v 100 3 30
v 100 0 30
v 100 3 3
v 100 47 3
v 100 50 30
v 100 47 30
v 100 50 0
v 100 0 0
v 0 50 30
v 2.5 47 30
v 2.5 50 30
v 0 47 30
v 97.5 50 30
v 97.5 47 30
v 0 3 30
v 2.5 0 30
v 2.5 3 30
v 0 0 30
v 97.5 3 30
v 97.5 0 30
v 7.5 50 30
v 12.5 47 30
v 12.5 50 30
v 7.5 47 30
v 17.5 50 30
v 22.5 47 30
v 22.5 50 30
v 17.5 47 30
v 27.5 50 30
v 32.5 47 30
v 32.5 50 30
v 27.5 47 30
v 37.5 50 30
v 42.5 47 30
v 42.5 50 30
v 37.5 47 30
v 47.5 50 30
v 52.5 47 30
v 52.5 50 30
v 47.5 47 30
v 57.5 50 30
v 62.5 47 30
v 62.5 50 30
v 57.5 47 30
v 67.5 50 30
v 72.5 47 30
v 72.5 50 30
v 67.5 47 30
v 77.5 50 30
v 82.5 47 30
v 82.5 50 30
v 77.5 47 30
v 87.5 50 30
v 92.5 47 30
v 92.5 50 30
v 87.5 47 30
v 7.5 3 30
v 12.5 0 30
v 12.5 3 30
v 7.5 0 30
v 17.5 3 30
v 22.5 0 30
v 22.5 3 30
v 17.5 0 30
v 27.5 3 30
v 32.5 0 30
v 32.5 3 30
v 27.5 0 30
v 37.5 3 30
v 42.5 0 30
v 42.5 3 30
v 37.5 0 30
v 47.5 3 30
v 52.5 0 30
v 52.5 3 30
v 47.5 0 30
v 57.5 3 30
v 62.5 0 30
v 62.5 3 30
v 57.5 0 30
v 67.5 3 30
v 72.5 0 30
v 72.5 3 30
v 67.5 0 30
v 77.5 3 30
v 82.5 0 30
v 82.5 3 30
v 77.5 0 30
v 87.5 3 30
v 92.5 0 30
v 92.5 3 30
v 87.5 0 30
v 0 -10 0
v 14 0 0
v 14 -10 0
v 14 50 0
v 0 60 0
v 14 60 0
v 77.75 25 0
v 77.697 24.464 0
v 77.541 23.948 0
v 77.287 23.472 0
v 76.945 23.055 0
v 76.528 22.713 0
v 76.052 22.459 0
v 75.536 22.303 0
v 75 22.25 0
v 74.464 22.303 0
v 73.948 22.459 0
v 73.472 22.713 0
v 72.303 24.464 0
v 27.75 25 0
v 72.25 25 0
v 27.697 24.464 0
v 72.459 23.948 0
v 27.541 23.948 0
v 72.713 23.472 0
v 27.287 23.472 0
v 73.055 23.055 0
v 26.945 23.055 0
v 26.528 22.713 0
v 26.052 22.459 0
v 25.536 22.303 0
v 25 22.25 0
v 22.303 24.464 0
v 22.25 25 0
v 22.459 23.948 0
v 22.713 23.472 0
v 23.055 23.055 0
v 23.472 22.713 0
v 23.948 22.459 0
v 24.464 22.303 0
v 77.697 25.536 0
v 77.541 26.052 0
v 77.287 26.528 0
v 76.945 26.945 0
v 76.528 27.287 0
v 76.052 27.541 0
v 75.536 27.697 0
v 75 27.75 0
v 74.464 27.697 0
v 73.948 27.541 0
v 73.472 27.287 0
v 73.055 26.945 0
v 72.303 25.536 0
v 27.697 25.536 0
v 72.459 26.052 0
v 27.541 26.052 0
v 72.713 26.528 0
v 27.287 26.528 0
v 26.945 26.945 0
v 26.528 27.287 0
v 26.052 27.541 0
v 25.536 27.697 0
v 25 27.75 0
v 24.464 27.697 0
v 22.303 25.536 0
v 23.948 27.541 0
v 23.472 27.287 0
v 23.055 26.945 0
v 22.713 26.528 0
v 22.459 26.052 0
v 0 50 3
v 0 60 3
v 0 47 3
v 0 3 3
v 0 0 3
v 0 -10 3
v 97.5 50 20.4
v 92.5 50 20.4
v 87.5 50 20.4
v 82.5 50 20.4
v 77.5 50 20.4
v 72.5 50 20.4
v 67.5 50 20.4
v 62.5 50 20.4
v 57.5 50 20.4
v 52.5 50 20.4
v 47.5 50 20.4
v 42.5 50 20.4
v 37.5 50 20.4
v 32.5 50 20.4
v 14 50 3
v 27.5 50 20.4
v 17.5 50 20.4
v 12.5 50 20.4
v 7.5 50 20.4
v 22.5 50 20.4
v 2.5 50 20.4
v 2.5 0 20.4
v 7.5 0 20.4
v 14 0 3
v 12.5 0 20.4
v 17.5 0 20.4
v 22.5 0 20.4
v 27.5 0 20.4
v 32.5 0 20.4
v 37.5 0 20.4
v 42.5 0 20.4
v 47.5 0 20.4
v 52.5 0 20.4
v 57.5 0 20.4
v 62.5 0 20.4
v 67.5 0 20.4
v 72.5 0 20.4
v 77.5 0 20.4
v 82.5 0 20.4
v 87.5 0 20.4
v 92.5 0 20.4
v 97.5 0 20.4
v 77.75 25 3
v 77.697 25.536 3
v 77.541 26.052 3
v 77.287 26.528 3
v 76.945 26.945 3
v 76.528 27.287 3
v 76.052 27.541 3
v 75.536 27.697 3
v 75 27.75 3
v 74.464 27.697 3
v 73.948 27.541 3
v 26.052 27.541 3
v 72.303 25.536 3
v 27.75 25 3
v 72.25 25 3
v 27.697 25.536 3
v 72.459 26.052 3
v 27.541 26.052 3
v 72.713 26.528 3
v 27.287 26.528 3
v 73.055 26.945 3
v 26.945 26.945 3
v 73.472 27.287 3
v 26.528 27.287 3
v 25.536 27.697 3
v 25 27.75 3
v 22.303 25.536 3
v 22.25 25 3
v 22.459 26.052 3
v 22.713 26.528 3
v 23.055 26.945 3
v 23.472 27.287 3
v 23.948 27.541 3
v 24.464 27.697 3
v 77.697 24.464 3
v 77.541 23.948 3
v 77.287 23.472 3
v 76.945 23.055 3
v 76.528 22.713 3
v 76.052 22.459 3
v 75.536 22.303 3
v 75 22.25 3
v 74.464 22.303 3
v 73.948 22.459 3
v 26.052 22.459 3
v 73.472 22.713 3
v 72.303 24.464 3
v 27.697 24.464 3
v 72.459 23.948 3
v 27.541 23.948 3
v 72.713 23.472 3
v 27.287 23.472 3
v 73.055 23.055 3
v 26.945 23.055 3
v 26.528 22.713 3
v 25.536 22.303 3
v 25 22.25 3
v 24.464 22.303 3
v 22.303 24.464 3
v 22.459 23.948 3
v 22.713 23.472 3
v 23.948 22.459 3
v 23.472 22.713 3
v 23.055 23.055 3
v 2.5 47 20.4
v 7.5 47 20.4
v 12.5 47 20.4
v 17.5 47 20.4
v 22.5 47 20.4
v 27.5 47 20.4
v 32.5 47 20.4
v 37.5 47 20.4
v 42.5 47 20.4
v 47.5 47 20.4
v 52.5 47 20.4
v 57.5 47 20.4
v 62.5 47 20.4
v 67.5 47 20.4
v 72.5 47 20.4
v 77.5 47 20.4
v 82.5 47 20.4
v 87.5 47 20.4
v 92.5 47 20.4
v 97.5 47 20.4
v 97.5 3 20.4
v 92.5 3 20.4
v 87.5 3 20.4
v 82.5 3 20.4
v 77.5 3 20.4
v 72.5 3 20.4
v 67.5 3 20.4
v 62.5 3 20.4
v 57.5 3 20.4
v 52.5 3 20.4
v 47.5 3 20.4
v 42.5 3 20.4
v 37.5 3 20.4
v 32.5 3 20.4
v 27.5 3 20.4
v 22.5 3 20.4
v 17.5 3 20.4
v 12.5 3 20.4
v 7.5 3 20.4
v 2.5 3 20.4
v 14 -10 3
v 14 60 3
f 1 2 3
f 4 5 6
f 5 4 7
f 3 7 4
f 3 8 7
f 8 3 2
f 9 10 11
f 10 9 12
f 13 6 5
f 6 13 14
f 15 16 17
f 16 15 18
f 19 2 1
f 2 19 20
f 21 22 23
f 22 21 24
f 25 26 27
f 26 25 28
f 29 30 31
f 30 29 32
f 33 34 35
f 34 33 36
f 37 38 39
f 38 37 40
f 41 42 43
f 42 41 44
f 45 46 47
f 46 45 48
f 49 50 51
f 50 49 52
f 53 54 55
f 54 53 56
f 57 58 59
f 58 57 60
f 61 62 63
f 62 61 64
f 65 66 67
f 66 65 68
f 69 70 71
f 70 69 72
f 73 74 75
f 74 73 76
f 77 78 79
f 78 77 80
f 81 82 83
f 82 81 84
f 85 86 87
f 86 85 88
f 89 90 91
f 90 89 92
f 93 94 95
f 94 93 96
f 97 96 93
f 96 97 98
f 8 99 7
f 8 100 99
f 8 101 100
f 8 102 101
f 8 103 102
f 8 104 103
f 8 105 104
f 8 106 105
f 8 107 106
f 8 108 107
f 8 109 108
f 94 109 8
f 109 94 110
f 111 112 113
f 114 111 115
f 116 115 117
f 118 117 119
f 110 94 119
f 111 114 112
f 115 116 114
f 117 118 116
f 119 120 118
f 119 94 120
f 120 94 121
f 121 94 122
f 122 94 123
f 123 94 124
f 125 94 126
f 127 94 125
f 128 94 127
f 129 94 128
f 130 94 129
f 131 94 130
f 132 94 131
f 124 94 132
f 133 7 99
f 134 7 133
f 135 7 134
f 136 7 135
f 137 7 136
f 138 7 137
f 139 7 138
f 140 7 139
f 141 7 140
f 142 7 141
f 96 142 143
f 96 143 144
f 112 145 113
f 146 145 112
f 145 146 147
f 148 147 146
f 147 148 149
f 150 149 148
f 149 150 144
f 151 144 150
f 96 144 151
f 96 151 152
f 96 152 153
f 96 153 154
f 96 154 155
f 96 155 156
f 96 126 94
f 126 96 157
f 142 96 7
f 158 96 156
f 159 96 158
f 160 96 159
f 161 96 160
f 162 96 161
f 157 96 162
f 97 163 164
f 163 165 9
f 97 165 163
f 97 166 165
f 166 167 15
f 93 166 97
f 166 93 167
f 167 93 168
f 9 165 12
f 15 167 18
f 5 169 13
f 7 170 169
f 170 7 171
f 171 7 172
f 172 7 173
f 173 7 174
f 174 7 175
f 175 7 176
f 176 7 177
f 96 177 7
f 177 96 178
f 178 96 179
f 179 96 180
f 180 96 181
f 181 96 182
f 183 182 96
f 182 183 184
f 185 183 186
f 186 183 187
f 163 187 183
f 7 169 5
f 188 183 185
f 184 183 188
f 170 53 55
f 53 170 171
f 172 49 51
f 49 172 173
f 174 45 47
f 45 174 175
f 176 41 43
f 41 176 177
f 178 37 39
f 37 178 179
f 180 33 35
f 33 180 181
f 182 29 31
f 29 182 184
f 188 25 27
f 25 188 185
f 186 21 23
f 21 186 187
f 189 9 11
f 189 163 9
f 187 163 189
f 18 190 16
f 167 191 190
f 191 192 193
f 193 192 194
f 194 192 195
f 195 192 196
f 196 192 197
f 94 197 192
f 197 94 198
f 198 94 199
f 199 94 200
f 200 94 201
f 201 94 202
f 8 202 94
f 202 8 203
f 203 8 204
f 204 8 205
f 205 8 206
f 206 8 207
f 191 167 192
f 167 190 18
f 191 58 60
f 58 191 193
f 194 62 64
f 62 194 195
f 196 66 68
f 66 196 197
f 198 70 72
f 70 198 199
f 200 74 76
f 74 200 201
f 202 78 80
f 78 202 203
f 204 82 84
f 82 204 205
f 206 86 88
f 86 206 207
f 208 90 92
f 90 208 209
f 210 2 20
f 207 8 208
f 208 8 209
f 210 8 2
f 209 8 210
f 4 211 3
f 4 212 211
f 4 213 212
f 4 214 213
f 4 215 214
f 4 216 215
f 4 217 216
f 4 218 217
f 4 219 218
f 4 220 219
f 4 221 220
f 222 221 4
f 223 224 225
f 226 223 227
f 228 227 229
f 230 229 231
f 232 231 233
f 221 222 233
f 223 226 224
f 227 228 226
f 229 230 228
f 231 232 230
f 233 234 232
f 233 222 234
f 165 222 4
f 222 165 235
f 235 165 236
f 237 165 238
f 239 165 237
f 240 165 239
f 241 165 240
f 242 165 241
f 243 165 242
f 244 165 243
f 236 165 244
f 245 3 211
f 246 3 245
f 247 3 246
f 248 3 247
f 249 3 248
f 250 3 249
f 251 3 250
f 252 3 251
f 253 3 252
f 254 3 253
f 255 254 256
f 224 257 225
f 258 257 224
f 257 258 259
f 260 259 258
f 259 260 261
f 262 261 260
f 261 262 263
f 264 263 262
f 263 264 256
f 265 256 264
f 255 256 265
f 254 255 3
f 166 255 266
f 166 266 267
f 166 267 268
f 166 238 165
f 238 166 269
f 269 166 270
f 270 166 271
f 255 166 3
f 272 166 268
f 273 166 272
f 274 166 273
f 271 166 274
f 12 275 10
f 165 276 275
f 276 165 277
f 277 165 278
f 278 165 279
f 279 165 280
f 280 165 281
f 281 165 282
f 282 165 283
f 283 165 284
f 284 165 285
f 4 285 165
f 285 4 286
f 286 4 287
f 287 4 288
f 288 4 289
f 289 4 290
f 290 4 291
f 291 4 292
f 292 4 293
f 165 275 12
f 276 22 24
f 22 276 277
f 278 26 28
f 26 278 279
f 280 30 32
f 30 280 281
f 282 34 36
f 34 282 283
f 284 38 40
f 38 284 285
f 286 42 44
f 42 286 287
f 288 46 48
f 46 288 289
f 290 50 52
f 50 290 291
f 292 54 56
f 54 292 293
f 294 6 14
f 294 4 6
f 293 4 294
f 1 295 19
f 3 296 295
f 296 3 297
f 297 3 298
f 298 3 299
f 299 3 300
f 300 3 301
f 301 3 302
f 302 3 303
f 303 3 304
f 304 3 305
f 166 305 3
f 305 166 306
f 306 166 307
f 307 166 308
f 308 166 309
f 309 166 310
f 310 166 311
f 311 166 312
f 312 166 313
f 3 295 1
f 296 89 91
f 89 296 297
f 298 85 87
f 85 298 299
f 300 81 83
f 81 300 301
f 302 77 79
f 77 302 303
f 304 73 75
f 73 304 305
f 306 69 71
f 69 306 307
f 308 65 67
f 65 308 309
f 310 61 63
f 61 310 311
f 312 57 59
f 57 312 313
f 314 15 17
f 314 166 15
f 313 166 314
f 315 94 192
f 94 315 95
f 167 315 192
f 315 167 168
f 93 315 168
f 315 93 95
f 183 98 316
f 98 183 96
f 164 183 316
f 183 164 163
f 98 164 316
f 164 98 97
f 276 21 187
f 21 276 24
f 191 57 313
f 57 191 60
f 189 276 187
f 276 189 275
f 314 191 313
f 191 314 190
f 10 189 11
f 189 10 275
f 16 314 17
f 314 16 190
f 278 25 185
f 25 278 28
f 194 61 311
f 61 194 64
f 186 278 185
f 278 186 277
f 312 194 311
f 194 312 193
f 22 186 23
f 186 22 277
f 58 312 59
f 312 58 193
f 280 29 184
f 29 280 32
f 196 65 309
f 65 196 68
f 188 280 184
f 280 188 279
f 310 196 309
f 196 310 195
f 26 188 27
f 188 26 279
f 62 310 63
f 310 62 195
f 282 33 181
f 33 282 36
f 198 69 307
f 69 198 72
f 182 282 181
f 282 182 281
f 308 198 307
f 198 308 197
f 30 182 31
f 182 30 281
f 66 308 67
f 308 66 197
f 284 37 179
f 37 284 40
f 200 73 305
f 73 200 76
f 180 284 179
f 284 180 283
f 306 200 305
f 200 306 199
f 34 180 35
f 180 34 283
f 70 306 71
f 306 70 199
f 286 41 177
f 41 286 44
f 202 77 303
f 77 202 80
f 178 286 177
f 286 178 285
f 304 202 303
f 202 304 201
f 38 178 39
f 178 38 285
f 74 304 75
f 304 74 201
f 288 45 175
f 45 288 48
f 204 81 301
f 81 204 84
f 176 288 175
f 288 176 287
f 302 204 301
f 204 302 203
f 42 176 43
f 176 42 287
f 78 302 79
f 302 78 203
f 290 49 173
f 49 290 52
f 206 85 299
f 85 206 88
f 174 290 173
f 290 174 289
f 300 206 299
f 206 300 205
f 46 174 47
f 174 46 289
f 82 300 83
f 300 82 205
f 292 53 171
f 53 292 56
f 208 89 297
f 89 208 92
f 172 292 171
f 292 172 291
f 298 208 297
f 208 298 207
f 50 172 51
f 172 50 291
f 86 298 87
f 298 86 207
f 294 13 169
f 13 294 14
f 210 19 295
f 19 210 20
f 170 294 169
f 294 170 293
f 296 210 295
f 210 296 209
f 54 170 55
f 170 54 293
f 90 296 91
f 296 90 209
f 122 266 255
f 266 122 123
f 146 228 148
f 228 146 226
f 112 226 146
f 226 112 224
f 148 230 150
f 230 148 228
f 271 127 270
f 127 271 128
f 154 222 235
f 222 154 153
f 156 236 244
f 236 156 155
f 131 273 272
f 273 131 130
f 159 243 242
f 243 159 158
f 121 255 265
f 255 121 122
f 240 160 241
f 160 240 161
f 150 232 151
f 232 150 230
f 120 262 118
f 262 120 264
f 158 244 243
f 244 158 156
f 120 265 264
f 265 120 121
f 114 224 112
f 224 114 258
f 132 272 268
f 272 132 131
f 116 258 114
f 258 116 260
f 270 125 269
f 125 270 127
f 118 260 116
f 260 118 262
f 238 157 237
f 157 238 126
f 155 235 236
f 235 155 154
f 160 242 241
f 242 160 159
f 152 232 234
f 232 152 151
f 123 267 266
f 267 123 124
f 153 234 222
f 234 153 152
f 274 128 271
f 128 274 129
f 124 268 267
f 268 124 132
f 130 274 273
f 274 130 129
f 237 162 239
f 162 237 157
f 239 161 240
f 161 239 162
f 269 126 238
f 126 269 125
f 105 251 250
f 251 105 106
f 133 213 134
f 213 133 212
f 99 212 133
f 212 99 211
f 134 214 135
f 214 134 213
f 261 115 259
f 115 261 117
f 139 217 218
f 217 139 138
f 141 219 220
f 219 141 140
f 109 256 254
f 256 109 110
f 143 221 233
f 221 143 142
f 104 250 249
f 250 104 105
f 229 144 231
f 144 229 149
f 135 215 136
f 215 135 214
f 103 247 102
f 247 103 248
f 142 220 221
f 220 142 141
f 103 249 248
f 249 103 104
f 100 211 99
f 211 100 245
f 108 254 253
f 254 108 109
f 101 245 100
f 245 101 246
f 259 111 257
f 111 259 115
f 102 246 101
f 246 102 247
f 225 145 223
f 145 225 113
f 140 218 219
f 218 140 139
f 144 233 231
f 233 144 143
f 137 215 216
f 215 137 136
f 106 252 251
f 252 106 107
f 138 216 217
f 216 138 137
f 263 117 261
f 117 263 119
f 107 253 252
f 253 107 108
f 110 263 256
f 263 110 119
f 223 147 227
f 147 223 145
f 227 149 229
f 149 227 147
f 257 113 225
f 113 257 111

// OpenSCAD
$fn = 32;

// ----------------------------------------------------------------------
// Cable duct: 100 x 50 x 30 mm, 10 fingers
// ----------------------------------------------------------------------

// --- parameters (mm) ---
channel_l = 100;          // duct length, X
channel_w = 50;           // duct width, Y
channel_h = 30;           // duct height, Z
channel_t = 3;            // side wall thickness
floor_t = 3;              // floor thickness
slot_w = 5;               // finger slot width
slot_h = 17.4;            // finger slot height
fingers = 10;             // number of finger slots per side
pitch = 10;               // finger pitch
hole_d = 5.5;             // floor mounting hole
hole_n = 2;               // mounting holes in the floor
ear_w = 11;               // mounting ear width
ear_l = 14;               // mounting ear length

module shell() {
  difference() {
    cube([channel_l, channel_w, channel_h]);
    /* open top channel */
    translate([-channel_t - 1, channel_t, floor_t])
      cube([channel_l + 2 * channel_t + 2, channel_w - 2 * channel_t, channel_h + 1]);
  }
}

module ears() {
  translate([0, -ear_w + 1, 0]) cube([ear_l, ear_w, floor_t]);
  translate([0, channel_w - 1, 0]) cube([ear_l, ear_w, floor_t]);
}

difference() {
  union() {
    shell();
    ears();
  }
  /* finger slots cut through both side walls */
  for (i = [0 : fingers - 1]) translate([pitch / 2 + i * pitch - slot_w / 2, -1, floor_t + slot_h]) cube([slot_w, channel_w + 2, channel_h]);
  for (i = [0 : hole_n - 1]) translate([(channel_l / hole_n) * (i + 0.5), channel_w / 2, -1]) cylinder(h = floor_t + 2, d = hole_d);
}
